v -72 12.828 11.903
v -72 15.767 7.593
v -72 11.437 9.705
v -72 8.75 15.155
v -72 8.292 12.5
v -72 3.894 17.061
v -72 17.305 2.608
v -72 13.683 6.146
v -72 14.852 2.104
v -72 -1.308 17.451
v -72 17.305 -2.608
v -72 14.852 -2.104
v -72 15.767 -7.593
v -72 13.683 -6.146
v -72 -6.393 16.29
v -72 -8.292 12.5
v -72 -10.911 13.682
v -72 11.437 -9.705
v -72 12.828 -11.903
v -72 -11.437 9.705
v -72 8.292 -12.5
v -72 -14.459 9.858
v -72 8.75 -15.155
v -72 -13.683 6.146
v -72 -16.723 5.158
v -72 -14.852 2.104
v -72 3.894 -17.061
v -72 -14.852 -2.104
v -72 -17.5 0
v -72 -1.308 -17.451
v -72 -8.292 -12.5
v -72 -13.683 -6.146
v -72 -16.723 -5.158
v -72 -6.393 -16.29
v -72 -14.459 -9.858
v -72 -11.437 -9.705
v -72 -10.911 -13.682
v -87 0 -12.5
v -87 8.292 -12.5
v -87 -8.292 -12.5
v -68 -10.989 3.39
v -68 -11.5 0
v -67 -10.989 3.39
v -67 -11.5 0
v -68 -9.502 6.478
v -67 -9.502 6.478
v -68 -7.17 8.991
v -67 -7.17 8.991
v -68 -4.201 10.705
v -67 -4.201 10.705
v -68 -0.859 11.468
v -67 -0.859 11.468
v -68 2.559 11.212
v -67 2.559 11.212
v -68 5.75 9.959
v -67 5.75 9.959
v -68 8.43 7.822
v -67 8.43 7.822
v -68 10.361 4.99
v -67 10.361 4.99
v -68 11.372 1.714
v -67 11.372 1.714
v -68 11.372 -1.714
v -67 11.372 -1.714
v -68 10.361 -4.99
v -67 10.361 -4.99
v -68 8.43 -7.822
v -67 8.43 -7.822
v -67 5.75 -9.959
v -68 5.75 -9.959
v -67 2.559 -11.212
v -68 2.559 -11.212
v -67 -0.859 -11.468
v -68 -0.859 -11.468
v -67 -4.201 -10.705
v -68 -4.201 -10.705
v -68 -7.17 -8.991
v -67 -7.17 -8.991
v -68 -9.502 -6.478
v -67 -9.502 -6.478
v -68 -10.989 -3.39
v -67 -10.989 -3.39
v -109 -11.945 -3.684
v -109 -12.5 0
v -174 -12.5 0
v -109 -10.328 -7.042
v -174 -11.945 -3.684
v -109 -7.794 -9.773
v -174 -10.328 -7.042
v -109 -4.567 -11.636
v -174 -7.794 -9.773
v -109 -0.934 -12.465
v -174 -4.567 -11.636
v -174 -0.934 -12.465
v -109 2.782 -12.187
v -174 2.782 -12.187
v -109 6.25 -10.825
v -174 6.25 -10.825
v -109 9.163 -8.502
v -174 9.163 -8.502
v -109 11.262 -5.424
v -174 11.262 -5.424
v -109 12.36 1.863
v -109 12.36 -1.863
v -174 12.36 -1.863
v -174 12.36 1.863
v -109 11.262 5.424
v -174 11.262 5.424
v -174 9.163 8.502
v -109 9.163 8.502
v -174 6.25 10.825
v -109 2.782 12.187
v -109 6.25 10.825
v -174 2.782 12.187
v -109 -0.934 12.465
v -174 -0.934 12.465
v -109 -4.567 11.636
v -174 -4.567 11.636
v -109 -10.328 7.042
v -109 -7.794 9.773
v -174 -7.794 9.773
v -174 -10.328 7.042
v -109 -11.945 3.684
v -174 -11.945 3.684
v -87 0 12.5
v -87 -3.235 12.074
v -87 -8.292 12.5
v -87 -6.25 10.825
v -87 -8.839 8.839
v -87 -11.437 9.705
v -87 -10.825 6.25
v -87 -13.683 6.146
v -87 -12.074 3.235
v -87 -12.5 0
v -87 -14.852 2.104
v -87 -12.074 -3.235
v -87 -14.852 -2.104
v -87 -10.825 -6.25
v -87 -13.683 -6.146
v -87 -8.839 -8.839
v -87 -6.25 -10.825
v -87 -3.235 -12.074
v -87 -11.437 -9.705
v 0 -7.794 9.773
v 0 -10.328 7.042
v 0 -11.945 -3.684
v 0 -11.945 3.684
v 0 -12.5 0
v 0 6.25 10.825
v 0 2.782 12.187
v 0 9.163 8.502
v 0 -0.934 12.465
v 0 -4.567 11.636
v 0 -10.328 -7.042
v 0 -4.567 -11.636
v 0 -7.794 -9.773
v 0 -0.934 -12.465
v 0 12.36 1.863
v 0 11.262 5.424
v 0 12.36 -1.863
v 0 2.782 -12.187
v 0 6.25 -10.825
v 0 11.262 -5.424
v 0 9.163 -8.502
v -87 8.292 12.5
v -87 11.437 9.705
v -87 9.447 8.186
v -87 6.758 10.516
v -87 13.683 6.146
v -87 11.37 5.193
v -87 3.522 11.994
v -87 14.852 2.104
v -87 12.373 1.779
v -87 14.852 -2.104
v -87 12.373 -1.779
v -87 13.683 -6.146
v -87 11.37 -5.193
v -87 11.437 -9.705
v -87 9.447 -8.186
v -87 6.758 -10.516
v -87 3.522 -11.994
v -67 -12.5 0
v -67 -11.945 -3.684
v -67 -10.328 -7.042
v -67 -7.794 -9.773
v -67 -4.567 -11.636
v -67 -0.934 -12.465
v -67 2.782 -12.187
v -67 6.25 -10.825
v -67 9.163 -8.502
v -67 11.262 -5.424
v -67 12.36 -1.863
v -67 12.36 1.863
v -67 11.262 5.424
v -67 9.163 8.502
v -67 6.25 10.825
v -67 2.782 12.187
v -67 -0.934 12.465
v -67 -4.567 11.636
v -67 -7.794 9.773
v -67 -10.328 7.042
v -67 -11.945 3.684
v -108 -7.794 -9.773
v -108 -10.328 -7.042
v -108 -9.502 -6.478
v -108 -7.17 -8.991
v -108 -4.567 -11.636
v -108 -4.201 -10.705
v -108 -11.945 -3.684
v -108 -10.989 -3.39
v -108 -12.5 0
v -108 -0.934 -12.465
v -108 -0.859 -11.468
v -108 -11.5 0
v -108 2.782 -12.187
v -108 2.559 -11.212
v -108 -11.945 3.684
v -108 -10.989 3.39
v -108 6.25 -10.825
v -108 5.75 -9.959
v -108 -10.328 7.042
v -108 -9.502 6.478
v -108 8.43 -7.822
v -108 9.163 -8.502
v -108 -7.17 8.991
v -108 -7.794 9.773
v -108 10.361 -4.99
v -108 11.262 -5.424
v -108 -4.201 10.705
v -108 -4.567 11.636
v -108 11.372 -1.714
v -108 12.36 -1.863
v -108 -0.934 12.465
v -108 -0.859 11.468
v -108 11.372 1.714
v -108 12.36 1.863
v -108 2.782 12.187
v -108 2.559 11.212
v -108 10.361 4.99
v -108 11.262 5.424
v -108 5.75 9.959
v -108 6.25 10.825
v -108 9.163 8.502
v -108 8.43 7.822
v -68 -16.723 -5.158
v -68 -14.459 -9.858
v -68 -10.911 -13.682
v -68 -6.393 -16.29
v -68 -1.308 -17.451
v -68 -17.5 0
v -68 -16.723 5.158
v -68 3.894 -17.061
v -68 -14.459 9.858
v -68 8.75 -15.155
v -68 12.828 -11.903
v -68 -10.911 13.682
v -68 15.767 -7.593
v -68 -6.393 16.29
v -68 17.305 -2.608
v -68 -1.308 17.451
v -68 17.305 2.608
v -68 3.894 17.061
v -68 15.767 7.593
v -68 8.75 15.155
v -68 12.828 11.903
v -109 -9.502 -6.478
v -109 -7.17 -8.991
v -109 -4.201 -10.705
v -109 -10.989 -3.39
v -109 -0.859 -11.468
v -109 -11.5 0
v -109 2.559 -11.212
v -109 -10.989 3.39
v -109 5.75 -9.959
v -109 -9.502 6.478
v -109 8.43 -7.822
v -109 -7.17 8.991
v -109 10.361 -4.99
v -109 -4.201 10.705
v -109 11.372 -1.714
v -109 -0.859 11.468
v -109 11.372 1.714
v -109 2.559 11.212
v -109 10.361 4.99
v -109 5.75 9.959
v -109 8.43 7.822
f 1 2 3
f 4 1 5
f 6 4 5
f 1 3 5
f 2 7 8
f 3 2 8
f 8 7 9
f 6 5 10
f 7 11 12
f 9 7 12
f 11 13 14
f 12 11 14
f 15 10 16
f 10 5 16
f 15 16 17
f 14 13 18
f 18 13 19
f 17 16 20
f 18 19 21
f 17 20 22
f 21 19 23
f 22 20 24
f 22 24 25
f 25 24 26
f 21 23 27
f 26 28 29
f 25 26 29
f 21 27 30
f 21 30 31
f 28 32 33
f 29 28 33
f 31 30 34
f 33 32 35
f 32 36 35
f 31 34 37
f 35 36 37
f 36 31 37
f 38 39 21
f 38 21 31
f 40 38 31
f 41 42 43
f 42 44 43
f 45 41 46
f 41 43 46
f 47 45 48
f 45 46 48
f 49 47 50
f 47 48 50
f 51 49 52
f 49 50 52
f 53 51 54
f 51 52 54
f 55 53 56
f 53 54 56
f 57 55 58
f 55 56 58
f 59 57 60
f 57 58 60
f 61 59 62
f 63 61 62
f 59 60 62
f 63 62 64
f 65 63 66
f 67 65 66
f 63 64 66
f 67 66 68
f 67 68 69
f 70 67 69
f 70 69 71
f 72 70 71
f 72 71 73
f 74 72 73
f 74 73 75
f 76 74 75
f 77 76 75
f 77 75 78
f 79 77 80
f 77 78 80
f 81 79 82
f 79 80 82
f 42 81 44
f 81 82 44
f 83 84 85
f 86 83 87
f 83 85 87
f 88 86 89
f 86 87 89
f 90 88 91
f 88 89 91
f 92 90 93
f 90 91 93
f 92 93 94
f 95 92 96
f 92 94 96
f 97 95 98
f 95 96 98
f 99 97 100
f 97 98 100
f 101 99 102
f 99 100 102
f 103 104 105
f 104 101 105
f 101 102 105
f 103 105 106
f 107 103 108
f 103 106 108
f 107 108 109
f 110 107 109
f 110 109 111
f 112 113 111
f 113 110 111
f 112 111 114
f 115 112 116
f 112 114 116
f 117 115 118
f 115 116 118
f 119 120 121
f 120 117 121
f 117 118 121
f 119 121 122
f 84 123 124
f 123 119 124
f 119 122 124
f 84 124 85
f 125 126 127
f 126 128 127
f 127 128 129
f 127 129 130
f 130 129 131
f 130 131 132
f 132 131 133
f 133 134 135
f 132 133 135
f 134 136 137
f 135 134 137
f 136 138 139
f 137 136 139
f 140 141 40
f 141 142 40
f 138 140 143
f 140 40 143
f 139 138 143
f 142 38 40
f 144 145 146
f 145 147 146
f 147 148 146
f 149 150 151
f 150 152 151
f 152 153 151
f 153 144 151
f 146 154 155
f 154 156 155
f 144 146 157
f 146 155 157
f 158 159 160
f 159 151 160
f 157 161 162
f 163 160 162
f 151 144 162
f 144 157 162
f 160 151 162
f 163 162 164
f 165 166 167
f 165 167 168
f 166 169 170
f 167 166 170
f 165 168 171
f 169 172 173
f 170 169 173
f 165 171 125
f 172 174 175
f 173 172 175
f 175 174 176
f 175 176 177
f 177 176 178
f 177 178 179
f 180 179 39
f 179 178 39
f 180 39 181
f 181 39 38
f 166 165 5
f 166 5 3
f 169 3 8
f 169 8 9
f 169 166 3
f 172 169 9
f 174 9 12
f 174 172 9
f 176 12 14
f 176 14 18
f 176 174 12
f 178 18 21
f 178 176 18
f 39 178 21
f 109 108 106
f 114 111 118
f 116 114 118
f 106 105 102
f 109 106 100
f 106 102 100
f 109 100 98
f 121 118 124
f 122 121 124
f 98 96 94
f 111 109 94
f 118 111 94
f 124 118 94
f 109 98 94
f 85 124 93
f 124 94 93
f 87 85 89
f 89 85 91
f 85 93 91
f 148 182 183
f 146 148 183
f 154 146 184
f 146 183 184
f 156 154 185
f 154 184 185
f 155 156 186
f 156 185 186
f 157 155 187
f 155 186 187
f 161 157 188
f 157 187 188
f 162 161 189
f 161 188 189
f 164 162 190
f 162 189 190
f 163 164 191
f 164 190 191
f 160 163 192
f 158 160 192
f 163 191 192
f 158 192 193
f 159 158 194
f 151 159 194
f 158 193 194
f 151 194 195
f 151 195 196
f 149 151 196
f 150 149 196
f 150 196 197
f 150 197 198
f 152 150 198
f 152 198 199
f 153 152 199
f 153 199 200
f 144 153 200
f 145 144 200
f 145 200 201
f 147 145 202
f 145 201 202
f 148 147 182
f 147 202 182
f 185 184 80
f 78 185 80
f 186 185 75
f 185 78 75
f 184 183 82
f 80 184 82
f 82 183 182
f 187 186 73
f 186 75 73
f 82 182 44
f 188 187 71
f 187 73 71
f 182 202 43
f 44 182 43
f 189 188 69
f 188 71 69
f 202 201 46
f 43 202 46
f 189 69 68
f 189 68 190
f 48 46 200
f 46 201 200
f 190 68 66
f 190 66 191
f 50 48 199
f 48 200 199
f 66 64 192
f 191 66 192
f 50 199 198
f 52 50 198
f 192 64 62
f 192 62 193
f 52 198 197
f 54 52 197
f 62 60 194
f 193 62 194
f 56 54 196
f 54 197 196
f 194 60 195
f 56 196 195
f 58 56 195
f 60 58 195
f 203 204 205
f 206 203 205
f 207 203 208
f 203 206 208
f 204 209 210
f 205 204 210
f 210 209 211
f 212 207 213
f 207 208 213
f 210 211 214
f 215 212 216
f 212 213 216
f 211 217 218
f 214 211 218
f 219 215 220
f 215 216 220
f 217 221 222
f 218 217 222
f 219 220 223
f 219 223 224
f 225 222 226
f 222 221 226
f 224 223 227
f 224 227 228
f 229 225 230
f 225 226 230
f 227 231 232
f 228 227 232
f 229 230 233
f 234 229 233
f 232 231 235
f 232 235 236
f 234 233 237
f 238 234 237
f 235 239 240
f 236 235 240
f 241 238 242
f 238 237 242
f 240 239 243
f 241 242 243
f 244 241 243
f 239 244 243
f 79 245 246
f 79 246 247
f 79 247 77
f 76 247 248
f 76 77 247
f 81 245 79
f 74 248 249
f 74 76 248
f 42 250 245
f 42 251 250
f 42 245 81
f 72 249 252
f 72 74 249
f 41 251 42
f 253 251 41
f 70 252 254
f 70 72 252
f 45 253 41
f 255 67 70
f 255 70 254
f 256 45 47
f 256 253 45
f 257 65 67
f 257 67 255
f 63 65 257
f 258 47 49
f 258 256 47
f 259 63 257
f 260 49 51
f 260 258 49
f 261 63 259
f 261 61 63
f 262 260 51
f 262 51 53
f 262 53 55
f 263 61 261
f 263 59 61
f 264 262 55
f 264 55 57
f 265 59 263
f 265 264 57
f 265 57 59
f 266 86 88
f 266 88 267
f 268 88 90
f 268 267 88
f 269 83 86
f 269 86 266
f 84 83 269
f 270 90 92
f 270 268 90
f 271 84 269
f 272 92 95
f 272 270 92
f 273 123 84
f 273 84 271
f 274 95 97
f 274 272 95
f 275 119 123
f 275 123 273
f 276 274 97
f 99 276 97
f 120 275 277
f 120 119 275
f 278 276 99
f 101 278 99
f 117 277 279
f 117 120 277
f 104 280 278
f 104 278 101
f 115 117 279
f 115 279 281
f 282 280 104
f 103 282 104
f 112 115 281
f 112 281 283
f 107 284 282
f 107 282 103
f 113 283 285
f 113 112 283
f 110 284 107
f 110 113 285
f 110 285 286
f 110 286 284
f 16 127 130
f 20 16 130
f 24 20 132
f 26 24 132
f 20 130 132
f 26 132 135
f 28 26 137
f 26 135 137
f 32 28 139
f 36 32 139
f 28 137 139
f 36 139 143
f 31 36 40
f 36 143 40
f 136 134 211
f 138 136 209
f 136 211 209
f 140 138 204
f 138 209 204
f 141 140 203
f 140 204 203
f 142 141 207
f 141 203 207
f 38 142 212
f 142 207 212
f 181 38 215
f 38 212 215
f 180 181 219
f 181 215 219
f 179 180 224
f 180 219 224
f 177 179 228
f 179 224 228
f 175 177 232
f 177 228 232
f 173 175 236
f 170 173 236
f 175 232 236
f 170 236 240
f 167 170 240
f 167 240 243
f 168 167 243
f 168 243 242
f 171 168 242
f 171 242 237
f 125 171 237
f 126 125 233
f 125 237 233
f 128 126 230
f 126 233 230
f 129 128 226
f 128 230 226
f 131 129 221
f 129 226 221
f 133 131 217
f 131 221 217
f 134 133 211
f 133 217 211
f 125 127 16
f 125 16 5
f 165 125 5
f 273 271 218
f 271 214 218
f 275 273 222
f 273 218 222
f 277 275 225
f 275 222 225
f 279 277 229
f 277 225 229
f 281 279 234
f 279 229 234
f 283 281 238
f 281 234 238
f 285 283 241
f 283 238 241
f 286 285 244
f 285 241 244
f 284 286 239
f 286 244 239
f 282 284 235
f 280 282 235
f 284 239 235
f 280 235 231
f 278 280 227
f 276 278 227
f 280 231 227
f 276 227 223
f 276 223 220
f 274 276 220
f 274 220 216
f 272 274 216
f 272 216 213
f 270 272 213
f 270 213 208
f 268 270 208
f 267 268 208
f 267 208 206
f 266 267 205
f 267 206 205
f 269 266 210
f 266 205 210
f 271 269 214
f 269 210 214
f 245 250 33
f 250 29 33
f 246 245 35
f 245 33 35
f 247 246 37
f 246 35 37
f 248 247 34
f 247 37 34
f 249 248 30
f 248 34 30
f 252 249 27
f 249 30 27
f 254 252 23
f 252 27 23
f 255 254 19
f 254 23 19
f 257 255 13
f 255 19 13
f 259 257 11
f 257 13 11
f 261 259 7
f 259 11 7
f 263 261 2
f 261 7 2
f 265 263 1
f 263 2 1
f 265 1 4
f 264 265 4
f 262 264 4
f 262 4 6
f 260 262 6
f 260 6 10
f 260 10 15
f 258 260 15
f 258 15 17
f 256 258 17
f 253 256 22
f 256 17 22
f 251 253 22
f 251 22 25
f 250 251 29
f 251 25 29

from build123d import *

# Parameters (mm, degrees)
SKETCH3_W          = 1
SKETCH3_H          = 1
SKETCH5_OUTSIDE_W  = 73.18
SKETCH5_OUTSIDE_H  = 73.18
CUT_EXTRUDE1_DEPTH = 15


with BuildPart() as part:
    # Sketch2 → Revolve1 (revolve)
    with BuildSketch(Plane.XY, mode=Mode.PRIVATE) as revolve1_sk:
        Polygon((0, 0), (0, 12.5), (-68, 12.5), (-68, 17.5), (-72, 17.5), (-72, 15), (-87, 15), (-87, 12.5), (-174, 12.5), (-174, 0), align=None)
    revolve(revolve1_sk.sketch.rotate(Axis((-174, 0, 0), (1, 0, 0)), 180), axis=Axis((-174, 0, 0), (1, 0, 0)))

    # Sketch3 → Cut-Revolve1 (revolve, cut)
    with BuildSketch(Plane.XY, mode=Mode.PRIVATE) as cut_revolve1_sk:
        with Locations((-67.5, 12)):
            Rectangle(SKETCH3_W, SKETCH3_H)
        with Locations((-108.5, 12)):
            Rectangle(SKETCH3_W, SKETCH3_H)
    revolve(cut_revolve1_sk.sketch.rotate(Axis((0, 0, 0), (-1, 0, 0)), 180), axis=Axis((0, 0, 0), (-1, 0, 0)), mode=Mode.SUBTRACT)

    # Sketch5 outside → Cut-Extrude1 (cut)
    with BuildSketch(Plane.ZY.offset(87)):
        Rectangle(SKETCH5_OUTSIDE_W, SKETCH5_OUTSIDE_H)
        with BuildLine():
            Line((-12.5, 8.291561976), (-12.5, -8.291561976))
            ThreePointArc((-12.5, -8.291561976), (0, -15), (12.5, -8.291561976))
            Line((12.5, -8.291561976), (12.5, 8.291561976))
            ThreePointArc((12.5, 8.291561976), (0, 15), (-12.5, 8.291561976))
        make_face(mode=Mode.SUBTRACT)
    extrude(amount=-CUT_EXTRUDE1_DEPTH, mode=Mode.SUBTRACT)


solid = part.part
